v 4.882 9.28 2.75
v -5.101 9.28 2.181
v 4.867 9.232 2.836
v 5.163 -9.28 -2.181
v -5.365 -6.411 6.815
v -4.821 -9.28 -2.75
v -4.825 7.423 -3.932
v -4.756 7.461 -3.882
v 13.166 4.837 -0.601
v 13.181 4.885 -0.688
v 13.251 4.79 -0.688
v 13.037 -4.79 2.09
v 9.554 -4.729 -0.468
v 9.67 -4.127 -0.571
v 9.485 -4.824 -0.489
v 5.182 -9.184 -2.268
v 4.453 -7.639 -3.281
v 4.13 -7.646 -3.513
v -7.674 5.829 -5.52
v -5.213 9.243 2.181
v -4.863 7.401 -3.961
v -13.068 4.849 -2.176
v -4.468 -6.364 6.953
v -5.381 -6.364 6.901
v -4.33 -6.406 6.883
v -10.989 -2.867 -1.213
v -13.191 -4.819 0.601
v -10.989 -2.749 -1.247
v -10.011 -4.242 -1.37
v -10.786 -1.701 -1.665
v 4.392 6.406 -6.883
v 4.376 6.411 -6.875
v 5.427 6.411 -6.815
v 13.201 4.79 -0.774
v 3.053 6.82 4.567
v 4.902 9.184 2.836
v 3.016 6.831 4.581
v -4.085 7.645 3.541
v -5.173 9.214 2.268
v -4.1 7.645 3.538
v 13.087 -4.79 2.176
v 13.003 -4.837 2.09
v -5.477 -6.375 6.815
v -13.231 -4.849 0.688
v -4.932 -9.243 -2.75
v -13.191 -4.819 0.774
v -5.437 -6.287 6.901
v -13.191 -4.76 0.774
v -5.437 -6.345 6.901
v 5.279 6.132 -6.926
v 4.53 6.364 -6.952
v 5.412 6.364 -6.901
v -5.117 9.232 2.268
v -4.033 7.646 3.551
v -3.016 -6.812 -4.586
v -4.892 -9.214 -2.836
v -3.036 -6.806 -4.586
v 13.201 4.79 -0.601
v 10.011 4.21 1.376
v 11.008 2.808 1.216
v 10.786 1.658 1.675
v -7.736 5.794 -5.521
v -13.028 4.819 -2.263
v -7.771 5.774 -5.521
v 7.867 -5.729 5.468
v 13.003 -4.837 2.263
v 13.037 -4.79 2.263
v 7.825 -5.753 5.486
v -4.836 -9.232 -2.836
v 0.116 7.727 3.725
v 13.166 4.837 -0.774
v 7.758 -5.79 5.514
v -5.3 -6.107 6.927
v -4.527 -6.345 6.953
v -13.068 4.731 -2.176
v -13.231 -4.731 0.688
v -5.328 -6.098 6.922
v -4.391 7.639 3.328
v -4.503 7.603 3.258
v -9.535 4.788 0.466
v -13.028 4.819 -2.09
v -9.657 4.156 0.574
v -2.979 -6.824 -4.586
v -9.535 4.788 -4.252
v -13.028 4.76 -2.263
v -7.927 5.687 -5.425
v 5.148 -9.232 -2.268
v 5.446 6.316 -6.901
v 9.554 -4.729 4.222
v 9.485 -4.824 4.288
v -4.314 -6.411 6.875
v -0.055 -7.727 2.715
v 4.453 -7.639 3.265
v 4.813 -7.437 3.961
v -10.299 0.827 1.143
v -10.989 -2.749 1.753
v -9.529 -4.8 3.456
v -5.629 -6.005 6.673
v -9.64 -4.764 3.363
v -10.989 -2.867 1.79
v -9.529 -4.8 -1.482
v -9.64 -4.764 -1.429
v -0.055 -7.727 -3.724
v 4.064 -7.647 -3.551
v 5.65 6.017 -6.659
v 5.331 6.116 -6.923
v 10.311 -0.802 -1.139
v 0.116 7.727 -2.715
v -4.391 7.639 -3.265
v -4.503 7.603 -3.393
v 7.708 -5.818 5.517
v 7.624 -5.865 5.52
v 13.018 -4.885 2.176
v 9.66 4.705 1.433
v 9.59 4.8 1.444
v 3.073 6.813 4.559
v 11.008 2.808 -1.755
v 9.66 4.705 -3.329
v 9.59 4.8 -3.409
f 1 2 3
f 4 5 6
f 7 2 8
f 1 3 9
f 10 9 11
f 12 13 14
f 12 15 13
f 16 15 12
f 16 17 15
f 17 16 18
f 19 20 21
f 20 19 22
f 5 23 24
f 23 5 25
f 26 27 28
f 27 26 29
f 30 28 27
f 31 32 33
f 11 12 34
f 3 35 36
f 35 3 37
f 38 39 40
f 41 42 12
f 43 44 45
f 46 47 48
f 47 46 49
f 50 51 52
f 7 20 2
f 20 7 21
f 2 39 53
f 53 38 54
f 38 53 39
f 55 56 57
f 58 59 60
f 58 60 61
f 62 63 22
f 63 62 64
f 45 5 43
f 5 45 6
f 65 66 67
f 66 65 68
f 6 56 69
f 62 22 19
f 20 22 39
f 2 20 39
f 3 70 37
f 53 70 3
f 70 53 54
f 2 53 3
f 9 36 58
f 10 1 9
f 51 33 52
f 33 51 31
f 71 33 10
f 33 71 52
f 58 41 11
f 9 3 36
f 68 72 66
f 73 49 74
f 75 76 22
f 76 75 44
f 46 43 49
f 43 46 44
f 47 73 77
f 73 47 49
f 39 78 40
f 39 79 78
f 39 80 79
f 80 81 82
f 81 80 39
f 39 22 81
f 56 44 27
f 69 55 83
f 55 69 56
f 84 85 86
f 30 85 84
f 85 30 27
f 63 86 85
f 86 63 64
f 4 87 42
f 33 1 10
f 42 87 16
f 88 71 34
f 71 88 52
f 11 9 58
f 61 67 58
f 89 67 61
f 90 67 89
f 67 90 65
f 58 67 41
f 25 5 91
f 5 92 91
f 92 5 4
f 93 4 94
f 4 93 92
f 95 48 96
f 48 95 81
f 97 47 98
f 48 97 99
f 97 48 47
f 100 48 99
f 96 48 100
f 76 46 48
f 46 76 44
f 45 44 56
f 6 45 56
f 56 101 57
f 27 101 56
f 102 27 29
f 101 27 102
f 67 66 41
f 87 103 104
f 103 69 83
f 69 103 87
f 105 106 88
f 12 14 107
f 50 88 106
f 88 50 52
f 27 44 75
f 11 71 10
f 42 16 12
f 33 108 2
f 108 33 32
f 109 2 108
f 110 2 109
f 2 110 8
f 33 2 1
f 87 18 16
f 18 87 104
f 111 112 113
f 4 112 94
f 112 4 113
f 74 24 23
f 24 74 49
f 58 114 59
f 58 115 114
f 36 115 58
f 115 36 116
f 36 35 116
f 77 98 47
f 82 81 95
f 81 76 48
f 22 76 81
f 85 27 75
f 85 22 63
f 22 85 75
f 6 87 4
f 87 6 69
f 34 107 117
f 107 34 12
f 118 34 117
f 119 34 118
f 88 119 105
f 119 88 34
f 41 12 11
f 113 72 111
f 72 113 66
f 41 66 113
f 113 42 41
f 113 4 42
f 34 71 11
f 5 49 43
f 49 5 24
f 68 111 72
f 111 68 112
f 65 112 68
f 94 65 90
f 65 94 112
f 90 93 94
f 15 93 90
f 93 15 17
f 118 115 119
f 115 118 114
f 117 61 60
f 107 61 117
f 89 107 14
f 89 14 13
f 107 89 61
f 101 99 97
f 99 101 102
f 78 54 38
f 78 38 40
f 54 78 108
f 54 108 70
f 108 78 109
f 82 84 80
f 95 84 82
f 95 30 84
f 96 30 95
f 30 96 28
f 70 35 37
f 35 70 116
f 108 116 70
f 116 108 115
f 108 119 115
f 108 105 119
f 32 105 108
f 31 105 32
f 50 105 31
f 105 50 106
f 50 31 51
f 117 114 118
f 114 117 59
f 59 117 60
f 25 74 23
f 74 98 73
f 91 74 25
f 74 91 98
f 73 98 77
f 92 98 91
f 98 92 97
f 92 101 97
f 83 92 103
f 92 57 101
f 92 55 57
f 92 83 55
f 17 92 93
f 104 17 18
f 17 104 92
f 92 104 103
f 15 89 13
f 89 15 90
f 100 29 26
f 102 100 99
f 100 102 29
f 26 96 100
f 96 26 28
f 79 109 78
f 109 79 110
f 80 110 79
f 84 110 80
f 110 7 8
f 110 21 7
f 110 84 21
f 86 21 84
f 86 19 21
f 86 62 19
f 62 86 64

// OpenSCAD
// Auto-generated OpenSCAD file

    inner_points = 10*[[0.9453936894816409, -0.47289547434939777, -0.19263732612249004], [0.9559597690770948, 0.47047255319654285, 0.13894241174769978], [-0.4527324971708146, -0.18894257072883713, -0.9559510908824418], [-0.44216641757536057, 0.7544254568171036, -0.624371353012252], [0.44216641757536057, -0.7544254568171036, 0.624371353012252], [0.4527324971708146, 0.18894257072883713, 0.9559510908824418], [-0.9559597690770948, -0.47047255319654285, -0.13894241174769978], [-0.9453936894816409, 0.47289547434939777, 0.19263732612249004], [1.0907778029145119, 0.2807812586554431, -0.8336013201880601], [0.22668829900201493, 0.4562738042971726, -1.305355170890352], [-0.22668829900201493, -0.4562738042971726, 1.305355170890352], [-1.0907778029145119, -0.2807812586554431, 0.8336013201880601], [-0.008548137956640611, -0.7632007662346396, -0.2682536429273739], [0.008548137956640611, 0.7632007662346396, 0.2682536429273739]];

    outer_points = 10*[[0.513230909726221, -0.9184428339478712, -0.2180946841600515], [0.4587614600394385, -0.6315952925971899, 0.738331772537947], [0.5396207656457714, 0.6315952925971899, -0.6814728995641832], [0.485151315958989, 0.9184428339478712, 0.27495355713381525], [-0.485151315958989, -0.9184428339478712, -0.27495355713381525], [-0.5396207656457714, -0.6315952925971899, 0.6814728995641832], [-0.4587614600394385, 0.6315952925971899, -0.738331772537947], [-0.513230909726221, 0.9184428339478712, 0.2180946841600515], [1.2987443863455765, -0.47898812303152916, 0.21762097438667488], [1.3150542142620716, 0.47898812303152916, -0.06876251237934862], [-1.3150542142620716, -0.47898812303152916, 0.06876251237934862], [-1.2987443863455765, 0.47898812303152916, -0.21762097438667488], [0.04406671047085817, -0.23206453574737165, -0.7737652573384957], [-0.04406671047085817, 0.23206453574737165, 0.7737652573384957]];

    // Convex hull for inner set (I)
    module inner_hull() {
        hull() {
            for (p = inner_points) {
                translate(p) sphere(r=0.1);
            }
        }
    }

    // Convex hull for outer set (O) minus inner hull (O \ I)
    module outer_minus_inner() {
        difference() {
            hull() {
                for (p = outer_points) {
                    translate(p) sphere(r=0.1);
                }
            }
            inner_hull(); // Subtract inner hull
        }
    }

    // Convex hull for outer set (O) minus all translated inner hulls
    module outer_minus_AllTranslationInner() {
        difference() {
            hull() {
                for (p = outer_points) {
                    translate(p) sphere(r=0.1);
                }
            }
            hull() {
                translate([0,0,50]) inner_hull();
                translate([0,0,-50]) inner_hull();
            }; // Subtract translated inner hulls
        }
    }

    // Difference between outer_minus_inner and outer_minus_AllTranslationInner
    module outer_minus_inner_diff() {
        difference() {
            // Outer minus inner
            difference() {
                hull() {
                    for (p = outer_points) {
                        translate(p) sphere(r=0.1);
                    }
                }
                inner_hull();
            }

            // Subtract Outer minus AllTranslationInner
            difference() {
                hull() {
                    for (p = outer_points) {
                        translate(p) sphere(r=0.1);
                    }
                }
                hull() {
                    translate([0,0,50]) inner_hull();
                    translate([0,0,-50]) inner_hull();
                };
            }
        }
    }

    // Rendering all with colors applied
    color([0, 1, 0, 1]) outer_minus_AllTranslationInner(); // Opaque green
    
